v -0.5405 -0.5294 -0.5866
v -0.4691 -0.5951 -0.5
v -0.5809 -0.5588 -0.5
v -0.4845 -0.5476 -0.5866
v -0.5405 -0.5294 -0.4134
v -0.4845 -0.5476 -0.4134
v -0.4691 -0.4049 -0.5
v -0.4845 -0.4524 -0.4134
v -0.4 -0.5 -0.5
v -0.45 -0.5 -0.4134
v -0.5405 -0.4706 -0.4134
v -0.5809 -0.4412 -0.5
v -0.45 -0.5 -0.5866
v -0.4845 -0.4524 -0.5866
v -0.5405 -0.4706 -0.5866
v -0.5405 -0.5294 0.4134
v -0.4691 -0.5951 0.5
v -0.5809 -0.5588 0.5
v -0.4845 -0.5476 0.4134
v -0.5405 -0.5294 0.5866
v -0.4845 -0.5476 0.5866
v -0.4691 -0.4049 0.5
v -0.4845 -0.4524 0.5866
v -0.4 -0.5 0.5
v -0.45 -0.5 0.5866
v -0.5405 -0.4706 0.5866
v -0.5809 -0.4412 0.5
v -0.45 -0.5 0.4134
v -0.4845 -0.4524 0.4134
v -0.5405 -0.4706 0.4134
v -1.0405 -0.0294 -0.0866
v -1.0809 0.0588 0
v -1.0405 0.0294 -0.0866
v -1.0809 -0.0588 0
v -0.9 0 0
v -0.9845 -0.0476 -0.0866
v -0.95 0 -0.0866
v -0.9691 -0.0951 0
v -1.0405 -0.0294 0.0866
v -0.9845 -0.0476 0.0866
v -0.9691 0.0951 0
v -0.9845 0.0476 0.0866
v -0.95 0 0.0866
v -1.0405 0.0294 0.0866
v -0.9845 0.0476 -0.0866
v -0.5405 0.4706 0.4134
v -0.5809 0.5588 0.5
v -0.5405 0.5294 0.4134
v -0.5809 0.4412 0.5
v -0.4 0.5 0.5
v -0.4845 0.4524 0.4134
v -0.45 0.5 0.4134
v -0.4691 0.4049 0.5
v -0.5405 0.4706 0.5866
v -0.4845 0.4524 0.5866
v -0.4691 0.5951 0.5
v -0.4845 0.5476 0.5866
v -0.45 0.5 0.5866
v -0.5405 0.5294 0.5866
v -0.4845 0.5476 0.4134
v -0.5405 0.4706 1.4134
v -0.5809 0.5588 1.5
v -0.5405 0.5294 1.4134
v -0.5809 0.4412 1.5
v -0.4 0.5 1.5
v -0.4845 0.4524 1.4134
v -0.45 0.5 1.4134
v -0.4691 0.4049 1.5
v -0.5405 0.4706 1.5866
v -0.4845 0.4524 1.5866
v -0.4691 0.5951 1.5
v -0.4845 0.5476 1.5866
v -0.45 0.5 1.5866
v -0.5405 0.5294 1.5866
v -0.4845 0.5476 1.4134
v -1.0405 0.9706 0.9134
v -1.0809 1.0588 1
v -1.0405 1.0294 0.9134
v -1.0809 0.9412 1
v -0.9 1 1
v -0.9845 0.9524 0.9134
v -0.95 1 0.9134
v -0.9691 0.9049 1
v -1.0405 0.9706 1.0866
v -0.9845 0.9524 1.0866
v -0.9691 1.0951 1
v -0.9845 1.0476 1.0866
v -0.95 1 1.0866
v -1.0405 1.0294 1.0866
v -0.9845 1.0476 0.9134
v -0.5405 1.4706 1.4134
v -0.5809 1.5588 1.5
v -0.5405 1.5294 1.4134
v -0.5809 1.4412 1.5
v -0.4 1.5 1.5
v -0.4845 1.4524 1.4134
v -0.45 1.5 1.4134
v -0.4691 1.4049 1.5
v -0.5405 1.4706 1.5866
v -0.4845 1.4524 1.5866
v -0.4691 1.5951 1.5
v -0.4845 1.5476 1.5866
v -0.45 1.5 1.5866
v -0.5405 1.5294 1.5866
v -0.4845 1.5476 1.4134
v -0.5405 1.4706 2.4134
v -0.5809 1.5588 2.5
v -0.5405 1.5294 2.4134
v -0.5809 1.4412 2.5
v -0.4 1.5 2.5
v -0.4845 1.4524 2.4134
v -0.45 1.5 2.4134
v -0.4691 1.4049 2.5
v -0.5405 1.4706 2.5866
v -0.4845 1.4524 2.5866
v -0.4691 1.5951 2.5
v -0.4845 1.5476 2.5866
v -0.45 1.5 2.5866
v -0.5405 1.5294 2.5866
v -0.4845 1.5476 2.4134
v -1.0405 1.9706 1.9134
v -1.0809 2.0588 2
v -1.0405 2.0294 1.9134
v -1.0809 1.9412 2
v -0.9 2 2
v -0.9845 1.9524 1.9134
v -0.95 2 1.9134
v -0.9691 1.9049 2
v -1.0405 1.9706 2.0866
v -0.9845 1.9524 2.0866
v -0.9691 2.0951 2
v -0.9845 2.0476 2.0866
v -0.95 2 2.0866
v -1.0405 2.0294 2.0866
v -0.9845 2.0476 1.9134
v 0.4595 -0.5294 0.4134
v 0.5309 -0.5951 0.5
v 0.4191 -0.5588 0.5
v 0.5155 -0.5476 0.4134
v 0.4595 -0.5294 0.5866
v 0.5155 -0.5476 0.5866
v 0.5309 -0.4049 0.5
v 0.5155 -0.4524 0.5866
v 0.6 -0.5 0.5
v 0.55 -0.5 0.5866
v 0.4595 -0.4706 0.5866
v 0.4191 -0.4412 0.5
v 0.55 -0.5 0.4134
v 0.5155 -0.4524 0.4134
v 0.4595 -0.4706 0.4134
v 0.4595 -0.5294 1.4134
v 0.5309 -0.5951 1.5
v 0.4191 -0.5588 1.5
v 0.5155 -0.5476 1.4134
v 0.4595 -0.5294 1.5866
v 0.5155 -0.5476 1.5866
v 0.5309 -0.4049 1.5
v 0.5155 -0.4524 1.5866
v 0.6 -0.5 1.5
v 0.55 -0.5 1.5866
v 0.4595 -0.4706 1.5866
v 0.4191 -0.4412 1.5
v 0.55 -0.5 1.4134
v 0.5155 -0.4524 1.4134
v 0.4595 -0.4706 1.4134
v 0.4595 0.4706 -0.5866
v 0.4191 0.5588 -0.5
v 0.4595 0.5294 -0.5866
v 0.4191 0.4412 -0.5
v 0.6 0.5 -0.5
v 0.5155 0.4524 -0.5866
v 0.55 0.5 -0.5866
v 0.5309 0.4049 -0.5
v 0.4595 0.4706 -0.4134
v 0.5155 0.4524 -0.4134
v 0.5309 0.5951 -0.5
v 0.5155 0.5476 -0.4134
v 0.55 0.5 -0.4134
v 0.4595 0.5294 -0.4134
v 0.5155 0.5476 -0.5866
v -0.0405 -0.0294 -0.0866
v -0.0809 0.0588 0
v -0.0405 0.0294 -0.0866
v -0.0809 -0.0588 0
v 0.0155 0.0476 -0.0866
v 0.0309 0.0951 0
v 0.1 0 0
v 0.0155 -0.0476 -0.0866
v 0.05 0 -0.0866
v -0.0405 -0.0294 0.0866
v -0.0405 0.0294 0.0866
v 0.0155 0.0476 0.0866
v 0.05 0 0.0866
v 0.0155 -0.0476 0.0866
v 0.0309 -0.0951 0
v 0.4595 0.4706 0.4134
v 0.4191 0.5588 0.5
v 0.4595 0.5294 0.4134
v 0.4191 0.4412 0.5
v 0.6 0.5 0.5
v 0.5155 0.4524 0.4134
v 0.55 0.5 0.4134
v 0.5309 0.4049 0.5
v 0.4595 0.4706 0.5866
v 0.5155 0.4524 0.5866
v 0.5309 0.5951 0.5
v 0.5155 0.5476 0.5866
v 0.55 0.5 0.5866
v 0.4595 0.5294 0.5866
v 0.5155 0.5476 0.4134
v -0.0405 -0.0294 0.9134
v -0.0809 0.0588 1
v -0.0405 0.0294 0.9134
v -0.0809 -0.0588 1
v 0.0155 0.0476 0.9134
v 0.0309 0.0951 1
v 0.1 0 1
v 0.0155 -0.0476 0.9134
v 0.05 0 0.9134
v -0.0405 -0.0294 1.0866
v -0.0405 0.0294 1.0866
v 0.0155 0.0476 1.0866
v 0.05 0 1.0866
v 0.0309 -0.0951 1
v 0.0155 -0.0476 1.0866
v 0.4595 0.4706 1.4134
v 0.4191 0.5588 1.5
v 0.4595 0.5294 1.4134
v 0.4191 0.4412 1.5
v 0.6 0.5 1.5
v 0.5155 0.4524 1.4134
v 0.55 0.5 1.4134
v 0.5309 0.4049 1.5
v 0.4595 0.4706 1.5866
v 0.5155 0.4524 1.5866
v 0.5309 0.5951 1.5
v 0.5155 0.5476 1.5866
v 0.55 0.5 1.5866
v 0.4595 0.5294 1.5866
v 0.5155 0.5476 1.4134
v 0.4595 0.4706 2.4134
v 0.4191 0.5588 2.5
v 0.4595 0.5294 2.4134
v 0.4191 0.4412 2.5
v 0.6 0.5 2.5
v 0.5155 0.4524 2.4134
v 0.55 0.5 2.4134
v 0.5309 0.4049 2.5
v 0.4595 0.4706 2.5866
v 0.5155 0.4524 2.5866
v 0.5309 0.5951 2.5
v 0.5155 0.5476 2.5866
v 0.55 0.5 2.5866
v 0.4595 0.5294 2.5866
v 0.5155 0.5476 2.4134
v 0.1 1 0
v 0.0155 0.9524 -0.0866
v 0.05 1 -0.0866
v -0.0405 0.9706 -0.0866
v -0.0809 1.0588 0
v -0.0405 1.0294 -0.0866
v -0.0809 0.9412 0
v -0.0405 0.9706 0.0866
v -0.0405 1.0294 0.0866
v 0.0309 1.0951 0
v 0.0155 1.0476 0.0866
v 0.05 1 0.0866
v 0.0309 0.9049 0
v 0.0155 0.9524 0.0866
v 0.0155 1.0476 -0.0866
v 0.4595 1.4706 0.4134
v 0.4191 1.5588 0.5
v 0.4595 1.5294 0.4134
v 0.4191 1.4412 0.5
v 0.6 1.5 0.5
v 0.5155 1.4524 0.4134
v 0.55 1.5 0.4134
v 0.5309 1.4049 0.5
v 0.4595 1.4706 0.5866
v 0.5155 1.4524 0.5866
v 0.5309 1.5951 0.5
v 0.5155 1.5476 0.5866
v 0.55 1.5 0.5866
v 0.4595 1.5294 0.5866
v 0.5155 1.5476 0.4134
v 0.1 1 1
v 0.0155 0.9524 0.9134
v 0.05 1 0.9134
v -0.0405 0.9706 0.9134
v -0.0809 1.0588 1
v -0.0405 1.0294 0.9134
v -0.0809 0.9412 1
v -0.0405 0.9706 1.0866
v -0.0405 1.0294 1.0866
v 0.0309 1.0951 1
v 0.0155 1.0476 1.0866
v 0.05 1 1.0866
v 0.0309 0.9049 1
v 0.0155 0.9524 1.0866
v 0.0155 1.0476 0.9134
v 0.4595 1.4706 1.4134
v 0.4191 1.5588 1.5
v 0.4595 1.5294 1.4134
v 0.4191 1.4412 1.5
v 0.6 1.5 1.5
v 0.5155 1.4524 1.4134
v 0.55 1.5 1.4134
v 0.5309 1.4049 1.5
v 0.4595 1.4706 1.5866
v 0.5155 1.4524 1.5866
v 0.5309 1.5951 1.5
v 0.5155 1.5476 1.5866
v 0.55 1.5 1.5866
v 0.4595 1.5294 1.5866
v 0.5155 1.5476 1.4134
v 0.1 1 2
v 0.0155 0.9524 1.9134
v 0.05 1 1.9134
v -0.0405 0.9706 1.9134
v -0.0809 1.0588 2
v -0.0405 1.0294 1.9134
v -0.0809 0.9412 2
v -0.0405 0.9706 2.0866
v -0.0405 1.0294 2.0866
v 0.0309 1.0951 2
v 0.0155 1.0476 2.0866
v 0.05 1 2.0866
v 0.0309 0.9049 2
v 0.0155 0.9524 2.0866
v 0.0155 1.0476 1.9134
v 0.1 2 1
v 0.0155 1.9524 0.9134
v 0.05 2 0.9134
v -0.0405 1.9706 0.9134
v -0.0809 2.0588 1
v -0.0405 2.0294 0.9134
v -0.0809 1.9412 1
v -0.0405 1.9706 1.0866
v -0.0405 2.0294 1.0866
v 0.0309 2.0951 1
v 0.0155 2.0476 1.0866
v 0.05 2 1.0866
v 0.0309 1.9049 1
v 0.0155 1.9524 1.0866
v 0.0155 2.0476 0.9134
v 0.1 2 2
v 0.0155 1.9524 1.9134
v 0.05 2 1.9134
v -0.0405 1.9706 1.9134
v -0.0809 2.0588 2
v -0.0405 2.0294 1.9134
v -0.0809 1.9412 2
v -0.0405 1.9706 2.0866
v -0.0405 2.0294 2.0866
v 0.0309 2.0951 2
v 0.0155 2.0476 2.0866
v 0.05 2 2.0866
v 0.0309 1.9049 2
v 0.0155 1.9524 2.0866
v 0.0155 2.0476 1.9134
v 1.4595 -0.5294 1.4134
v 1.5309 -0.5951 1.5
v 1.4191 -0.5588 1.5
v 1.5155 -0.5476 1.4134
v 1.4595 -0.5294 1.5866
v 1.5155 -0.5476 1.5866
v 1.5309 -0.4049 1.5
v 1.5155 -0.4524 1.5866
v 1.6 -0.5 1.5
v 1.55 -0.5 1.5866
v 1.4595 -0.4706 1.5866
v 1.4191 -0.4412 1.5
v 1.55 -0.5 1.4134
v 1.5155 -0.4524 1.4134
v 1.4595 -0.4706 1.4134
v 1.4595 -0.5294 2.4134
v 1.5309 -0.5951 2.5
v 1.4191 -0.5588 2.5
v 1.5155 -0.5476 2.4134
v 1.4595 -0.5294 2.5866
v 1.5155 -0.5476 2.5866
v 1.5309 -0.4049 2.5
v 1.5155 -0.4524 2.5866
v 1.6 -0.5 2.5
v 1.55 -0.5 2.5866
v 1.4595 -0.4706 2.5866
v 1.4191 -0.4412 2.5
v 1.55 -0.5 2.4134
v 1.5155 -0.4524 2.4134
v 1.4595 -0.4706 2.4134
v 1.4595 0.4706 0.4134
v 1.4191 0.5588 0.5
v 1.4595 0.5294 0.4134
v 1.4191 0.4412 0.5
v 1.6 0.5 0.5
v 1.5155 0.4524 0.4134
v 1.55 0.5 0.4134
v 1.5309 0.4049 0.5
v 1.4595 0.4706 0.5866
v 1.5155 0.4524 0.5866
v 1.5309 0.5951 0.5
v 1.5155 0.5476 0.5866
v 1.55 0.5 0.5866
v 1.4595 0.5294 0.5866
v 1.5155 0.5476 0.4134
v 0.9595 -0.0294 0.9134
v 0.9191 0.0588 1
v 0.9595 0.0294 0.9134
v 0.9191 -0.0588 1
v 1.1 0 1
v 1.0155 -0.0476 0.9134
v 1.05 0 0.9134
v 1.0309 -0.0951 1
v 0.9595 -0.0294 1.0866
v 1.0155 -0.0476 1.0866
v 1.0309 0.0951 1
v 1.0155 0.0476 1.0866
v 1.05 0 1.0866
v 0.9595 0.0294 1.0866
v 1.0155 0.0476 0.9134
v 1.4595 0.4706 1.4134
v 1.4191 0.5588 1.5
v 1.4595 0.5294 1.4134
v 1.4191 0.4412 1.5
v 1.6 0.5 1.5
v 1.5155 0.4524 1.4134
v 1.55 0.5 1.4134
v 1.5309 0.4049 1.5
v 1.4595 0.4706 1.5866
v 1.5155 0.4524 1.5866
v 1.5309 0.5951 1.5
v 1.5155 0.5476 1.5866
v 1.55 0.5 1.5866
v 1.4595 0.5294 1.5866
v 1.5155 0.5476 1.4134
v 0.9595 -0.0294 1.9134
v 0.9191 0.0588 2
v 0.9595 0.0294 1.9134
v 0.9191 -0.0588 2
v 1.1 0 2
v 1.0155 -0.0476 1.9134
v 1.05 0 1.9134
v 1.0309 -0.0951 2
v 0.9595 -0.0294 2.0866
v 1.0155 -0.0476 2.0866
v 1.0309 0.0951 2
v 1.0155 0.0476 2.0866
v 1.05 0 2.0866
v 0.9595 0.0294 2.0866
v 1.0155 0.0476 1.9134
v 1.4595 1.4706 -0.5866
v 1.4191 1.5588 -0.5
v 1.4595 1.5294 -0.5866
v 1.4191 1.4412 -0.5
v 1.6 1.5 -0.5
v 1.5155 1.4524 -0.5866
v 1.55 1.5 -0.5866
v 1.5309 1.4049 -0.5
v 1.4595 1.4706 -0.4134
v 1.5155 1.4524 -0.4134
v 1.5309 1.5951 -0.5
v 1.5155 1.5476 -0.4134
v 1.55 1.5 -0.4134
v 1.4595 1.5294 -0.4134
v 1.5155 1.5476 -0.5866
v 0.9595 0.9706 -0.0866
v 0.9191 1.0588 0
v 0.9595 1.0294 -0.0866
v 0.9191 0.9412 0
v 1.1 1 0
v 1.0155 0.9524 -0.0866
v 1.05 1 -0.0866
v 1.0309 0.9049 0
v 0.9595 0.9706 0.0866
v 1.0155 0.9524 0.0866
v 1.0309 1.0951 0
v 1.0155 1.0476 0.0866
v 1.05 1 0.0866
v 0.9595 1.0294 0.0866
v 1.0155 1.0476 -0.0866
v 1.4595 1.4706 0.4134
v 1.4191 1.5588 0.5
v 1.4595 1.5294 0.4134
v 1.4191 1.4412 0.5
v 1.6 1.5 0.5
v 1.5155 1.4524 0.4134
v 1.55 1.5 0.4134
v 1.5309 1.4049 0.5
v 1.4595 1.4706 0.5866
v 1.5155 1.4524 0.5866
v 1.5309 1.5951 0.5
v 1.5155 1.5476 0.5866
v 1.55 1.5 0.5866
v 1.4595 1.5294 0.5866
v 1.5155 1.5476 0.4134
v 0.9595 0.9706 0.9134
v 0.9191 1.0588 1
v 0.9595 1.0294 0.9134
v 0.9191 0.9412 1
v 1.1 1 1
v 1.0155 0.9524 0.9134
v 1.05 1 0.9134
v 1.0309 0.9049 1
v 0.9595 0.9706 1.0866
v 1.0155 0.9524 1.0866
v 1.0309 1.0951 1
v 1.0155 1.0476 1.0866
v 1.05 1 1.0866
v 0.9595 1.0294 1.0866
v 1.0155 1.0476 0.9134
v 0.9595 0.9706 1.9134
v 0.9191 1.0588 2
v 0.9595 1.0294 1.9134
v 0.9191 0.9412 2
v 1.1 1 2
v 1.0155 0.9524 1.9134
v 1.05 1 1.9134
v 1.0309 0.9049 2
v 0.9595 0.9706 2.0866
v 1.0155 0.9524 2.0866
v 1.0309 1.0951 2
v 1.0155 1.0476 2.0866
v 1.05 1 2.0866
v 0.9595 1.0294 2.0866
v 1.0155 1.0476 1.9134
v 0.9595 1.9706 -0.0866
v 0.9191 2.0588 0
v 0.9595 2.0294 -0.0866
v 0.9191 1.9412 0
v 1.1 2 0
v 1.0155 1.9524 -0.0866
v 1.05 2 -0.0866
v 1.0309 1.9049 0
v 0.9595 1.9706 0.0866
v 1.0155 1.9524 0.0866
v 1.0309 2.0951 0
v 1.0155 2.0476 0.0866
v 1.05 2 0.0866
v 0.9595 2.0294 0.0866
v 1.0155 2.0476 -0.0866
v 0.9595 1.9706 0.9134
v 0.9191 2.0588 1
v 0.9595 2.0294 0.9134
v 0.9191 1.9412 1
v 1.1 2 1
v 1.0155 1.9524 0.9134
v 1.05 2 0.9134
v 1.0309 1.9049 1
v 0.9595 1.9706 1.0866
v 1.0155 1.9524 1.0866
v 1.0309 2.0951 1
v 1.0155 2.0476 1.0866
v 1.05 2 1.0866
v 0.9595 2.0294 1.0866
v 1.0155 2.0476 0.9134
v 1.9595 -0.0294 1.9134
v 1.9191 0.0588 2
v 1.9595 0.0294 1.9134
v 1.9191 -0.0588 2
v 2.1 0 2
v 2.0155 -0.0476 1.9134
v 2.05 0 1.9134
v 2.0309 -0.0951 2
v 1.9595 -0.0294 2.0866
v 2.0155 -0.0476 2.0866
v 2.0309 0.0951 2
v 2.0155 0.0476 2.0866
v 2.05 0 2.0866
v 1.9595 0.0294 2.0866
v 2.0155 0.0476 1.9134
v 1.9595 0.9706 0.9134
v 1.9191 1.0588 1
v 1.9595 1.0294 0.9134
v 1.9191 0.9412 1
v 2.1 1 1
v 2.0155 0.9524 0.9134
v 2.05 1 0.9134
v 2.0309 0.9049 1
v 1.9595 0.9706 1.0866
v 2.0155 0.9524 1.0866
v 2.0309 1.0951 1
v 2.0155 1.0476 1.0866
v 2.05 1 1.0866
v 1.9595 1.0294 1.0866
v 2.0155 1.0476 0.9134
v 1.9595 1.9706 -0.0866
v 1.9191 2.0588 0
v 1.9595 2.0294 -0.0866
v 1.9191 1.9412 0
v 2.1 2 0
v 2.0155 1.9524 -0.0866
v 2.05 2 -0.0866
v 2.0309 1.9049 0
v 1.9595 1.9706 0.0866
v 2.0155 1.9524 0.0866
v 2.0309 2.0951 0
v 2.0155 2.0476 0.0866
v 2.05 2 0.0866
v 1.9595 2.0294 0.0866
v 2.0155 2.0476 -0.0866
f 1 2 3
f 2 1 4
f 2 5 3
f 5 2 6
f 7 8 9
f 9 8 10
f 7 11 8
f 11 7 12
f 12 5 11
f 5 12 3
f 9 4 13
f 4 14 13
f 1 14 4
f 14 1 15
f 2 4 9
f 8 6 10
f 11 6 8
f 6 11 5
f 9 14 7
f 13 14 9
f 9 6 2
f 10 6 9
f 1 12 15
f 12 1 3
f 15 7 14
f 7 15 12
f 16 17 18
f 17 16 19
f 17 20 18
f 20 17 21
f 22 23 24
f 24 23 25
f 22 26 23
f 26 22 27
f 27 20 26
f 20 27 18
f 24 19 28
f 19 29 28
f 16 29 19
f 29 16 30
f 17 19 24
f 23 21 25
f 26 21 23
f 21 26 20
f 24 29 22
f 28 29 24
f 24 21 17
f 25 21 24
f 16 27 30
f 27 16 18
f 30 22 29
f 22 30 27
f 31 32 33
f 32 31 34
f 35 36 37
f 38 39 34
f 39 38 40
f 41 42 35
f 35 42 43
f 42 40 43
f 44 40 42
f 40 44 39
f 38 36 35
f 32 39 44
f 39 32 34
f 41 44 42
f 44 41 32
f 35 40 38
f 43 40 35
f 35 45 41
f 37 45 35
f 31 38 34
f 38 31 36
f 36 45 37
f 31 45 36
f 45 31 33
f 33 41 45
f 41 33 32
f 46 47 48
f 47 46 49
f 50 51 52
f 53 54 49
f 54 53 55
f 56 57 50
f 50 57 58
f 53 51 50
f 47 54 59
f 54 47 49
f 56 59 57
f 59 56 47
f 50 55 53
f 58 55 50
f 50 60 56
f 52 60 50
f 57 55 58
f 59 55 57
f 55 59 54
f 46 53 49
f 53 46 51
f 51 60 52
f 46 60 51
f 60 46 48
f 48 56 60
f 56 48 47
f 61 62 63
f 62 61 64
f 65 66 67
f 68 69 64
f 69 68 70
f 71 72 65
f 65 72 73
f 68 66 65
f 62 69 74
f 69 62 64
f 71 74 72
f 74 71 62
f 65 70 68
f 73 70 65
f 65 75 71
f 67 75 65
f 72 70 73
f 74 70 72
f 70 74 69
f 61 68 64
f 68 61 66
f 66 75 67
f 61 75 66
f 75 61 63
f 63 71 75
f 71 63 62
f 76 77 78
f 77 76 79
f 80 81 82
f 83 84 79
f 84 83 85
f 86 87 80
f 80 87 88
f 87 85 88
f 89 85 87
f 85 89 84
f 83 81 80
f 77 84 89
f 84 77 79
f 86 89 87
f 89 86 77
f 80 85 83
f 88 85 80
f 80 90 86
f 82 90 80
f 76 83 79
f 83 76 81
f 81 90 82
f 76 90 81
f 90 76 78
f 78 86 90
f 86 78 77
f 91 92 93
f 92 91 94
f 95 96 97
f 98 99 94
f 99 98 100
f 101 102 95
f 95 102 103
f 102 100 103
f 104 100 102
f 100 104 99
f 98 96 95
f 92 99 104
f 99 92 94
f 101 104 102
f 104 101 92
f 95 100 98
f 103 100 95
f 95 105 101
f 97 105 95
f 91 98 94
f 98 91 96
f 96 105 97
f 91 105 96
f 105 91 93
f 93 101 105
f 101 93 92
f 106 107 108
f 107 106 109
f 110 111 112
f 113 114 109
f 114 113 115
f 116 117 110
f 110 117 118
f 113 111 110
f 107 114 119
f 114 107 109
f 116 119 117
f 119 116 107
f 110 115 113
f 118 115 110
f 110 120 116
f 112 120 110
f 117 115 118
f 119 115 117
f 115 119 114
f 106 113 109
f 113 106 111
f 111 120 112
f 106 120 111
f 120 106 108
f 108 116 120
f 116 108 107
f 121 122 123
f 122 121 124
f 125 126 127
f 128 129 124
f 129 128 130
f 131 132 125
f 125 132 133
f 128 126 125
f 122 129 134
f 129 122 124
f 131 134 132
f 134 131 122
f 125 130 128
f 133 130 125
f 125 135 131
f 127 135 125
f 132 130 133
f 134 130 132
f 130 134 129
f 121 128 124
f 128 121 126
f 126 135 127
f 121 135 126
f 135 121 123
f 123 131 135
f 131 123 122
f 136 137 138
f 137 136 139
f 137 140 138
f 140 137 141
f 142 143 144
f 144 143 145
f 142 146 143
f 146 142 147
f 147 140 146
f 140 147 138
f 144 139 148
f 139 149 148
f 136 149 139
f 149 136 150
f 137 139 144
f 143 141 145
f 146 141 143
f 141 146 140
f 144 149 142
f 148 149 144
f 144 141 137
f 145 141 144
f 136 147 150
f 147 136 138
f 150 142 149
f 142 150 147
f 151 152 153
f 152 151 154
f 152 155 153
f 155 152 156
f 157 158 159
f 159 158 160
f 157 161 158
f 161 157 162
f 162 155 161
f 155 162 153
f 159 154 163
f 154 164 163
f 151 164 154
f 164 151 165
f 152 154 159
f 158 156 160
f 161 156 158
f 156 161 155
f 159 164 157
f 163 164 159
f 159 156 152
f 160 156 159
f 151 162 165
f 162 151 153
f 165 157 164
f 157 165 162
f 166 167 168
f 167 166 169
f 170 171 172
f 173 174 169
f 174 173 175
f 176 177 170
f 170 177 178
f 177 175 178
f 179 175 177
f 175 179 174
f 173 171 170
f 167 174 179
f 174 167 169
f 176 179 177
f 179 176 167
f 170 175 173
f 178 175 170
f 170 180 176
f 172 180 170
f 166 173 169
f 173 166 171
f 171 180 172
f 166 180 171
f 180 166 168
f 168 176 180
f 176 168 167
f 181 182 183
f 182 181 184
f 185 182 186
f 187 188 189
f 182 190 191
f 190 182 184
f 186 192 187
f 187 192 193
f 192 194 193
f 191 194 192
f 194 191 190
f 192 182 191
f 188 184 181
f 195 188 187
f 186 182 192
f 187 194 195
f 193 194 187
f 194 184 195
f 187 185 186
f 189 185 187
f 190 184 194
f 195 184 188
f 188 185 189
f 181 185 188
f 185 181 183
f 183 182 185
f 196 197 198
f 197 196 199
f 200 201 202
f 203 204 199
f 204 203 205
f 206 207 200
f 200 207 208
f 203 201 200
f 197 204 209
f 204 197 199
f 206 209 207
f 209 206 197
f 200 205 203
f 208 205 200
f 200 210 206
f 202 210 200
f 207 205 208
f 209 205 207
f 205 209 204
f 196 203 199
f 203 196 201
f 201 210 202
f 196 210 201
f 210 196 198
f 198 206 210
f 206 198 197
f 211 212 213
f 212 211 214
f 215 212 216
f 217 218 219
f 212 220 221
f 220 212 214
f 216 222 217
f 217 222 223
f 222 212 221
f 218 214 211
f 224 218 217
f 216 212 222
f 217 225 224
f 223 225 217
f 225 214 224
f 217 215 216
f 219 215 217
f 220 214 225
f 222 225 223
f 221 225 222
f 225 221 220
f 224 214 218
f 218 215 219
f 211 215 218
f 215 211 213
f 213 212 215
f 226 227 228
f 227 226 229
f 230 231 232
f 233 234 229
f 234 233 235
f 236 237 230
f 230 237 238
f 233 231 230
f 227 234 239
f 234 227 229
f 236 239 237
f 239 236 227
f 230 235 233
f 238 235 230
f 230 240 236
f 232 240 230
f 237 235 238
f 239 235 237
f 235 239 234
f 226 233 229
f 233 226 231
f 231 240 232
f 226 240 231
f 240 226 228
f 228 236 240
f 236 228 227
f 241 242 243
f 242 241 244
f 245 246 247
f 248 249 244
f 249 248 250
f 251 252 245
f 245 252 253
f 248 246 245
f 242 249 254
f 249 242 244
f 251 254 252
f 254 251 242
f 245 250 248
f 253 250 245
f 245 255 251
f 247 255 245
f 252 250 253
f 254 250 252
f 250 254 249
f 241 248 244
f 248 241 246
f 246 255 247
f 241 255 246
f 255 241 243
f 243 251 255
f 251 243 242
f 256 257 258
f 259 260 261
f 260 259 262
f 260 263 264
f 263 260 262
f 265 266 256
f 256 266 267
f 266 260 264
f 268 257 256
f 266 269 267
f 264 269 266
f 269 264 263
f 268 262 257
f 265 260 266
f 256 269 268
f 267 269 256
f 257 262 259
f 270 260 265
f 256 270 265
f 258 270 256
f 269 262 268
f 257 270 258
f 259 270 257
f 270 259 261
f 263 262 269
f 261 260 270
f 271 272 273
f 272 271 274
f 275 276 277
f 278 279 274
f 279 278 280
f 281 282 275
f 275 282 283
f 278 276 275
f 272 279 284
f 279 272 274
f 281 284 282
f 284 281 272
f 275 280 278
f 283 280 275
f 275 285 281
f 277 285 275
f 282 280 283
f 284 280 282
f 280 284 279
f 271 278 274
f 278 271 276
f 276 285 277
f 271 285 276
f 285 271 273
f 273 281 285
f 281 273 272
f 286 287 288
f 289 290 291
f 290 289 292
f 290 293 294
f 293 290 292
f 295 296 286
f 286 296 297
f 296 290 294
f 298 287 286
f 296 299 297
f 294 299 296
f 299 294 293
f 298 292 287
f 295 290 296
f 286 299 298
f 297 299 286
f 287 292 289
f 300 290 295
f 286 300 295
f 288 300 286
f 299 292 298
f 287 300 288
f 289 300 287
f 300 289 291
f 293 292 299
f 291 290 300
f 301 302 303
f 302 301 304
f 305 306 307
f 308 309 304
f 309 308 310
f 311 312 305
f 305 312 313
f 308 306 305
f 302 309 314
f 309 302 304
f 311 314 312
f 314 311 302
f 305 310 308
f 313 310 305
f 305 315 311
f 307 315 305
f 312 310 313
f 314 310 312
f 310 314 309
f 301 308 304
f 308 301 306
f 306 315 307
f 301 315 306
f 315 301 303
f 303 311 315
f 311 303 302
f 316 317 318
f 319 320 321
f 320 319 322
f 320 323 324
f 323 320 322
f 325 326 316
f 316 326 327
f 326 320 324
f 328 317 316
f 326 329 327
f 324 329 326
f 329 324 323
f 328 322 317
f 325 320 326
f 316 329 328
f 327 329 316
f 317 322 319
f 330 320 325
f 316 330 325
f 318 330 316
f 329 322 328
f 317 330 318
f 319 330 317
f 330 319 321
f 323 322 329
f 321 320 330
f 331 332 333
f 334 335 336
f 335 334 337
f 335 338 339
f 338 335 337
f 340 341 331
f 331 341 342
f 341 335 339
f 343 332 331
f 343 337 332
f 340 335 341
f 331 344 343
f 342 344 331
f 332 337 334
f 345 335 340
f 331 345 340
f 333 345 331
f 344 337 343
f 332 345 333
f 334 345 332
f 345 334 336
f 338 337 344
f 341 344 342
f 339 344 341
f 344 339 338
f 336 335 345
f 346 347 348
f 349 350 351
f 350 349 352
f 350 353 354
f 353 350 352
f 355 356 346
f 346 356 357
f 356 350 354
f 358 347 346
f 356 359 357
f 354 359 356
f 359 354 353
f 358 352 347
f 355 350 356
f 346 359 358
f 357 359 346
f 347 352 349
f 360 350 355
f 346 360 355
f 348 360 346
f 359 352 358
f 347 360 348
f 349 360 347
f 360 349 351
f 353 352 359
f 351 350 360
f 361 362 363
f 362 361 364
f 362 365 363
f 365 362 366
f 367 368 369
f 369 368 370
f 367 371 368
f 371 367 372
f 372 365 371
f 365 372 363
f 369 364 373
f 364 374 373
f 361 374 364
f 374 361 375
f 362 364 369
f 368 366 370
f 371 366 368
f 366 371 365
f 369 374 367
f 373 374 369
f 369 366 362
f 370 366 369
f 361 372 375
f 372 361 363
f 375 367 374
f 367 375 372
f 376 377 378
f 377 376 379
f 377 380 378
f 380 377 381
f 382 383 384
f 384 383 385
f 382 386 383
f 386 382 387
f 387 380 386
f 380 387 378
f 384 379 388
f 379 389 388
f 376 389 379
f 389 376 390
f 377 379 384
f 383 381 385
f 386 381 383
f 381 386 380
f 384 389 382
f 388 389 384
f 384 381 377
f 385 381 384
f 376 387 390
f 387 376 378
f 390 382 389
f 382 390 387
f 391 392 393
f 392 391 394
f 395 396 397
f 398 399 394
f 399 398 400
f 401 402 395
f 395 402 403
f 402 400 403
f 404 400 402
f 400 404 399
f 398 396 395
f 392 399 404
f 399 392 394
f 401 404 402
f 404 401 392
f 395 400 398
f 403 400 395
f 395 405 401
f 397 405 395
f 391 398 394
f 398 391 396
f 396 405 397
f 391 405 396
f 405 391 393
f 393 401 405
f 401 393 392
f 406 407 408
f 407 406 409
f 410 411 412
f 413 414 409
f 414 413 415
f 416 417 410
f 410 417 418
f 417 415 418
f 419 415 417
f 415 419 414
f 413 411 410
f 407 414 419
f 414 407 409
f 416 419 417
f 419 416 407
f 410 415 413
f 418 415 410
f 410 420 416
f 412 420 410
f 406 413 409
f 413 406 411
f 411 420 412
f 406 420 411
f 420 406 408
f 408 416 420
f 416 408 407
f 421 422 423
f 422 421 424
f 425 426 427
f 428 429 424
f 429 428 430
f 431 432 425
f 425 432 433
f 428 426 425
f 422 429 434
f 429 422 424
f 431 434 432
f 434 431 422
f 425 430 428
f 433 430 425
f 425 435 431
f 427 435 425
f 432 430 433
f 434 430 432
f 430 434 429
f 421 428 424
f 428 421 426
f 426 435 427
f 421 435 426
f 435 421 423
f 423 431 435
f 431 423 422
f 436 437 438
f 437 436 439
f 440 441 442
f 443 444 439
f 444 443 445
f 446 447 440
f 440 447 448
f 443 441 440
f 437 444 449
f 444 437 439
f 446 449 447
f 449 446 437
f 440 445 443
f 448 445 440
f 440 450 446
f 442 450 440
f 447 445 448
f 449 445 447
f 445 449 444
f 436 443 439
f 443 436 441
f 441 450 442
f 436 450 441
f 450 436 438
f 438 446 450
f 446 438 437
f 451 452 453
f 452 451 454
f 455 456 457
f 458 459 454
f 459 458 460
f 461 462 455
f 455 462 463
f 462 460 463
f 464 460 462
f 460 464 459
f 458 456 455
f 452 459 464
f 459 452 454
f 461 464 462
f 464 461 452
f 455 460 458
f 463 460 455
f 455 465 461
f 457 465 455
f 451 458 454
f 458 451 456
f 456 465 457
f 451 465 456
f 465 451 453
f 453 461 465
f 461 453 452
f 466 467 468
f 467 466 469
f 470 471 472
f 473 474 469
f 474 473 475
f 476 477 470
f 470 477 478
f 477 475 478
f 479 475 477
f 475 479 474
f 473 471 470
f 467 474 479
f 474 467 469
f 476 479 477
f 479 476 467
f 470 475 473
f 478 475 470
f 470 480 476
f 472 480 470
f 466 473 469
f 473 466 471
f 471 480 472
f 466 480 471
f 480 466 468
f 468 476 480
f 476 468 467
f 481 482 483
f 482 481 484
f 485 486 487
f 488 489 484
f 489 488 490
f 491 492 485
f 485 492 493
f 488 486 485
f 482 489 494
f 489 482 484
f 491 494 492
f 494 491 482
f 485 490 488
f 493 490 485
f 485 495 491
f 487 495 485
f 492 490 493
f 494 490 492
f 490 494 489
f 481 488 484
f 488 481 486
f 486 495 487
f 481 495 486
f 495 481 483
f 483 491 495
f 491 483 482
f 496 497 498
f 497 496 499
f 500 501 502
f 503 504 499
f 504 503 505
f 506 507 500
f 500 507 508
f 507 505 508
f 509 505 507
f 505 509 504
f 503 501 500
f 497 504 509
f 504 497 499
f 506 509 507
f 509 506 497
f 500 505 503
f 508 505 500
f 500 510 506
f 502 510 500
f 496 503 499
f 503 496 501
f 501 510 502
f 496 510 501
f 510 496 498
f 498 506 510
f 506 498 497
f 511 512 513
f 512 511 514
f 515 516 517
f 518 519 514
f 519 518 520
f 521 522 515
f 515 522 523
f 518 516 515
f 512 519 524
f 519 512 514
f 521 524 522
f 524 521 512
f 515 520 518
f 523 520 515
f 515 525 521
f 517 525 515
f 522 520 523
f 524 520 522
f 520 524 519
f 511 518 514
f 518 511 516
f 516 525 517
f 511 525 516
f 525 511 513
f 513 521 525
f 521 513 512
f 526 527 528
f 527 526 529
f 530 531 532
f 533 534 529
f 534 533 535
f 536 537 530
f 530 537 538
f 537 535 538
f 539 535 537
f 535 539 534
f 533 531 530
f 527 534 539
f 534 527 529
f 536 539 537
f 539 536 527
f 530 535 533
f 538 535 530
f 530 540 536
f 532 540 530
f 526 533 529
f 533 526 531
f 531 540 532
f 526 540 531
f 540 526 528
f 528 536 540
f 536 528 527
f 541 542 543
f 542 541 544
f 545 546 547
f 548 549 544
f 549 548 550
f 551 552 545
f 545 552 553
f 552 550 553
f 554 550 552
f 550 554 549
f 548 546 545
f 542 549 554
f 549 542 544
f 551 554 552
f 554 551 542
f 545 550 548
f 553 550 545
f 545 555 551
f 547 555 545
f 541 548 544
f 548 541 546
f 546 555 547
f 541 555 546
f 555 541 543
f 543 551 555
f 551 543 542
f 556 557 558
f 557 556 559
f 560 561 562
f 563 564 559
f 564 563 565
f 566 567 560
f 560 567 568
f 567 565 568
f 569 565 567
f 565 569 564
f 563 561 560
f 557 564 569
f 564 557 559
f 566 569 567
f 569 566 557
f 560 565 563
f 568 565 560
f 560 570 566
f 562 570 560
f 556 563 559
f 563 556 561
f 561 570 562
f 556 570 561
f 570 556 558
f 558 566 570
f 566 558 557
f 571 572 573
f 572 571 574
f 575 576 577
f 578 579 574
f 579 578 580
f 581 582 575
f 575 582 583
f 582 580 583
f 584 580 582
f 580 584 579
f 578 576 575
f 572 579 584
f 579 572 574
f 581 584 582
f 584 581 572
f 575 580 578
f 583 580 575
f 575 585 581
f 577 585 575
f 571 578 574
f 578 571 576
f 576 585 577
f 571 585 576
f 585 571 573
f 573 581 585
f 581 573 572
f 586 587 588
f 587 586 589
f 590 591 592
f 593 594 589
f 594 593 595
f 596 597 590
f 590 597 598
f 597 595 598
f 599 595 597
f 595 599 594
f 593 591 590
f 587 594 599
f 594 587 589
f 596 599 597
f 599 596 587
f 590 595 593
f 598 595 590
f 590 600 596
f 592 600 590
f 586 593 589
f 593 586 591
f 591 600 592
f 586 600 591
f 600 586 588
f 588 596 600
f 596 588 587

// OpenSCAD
// file: 3d_tetrahedres.scad
use <lattice.scad>;

// Check if a vertex is adjacent to the central layer (that sets the size of processor).
// n as n_code in article (starts at 1).
function central_layer(x, y, z, n) = ((x+z == n-2) || (x+z == n-1)) ? true : false;

// Elementary tetrahedron as described in Equation (18) of arXiv:1311.0879.
// x, y, z : coordinates of vector x in arXiv:1311.0879
// s : +- 1
// permut : integer between 0 and 5 (included) that describe the permutation (a, b, c) :
//          0 : (a, b, c) = (i, j, k)
//          1 : (a, b, c) = (i, k, j)
//          2 : (a, b, c) = (j, i, k)
//          3 : (a, b, c) = (j, k, i)
//          4 : (a, b, c) = (k, i, j)
//          5 : (a, b, c) = (k, j, i)
// n : we keep only tetrahedron included in the code structure indexed by n.
//     n is as in Equation (19) of arXiv:1311.0879 (starts at 1).
//     use -1 for no filter
 module tetraedre (x, y, z, s, permut, n) {
     // if (permut==0) {xa=1; ya=0; za=0; xb=0; yb=1; zb=0; xc=0; yc=0; zc=1;}
     // if (permut==1) {xa=1; ya=0; za=0; xb=0; yb=0; zb=1; xc=0; yc=1; zc=0;}
     // if (permut==2) {xa=0; ya=1; za=0; xb=1; yb=0; zb=0; xc=0; yc=0; zc=1;}
     // if (permut==3) {xa=0; ya=1; za=0; xb=0; yb=0; zb=1; xc=1; yc=0; zc=0;}
     // if (permut==4) {xa=0; ya=0; za=1; xb=1; yb=0; zb=0; xc=0; yc=1; zc=0;}
     // if (permut==5) {xa=0; ya=0; za=1; xb=0; yb=1; zb=0; xc=1; yc=0; zc=0;}
     xa = permut==0 || permut==1 ? 1 : 0;
     ya = permut==2 || permut==3 ? 1 : 0;
     za = permut==4 || permut==5 ? 1 : 0;
     xb = permut==2 || permut==4 ? 1 : 0;
     yb = permut==0 || permut==5 ? 1 : 0;
     zb = permut==1 || permut==3 ? 1 : 0;
     xc = permut==3 || permut==5 ? 1 : 0;
     yc = permut==1 || permut==4 ? 1 : 0;
     zc = permut==0 || permut==2 ? 1 : 0;

     // Coordinates of vertices of the tetrahedron.
     x1=x; y1=y; z1=z;                                               // x
     x2=x+xa; y2=y+ya; z2=z+za;                                      // x + a
     x3=x+(xa+s*xb+xc)/2; y3=y+(ya+s*yb+yc)/2; z3=z+(za+s*zb+zc)/2;  // x + (a+sb+c)/2
     x4=x+(xa+s*xb-xc)/2; y4=y+(ya+s*yb-yc)/2; z4=z+(za+s*zb-zc)/2;  // x + (a+sb-c)/2

     if (n == -1 || (
         filtre(x1, y1, z1, n)
         && filtre(x2, y2, z2, n)
         && filtre(x3, y3, z3, n)
         && filtre(x4, y4, z4, n)
     )) {
         // echo(x, y, z, s, permut, n);
         if (central_layer(x1, y1, z1, n)
             && central_layer(x2, y2, z2, n)
             && central_layer(x3, y3, z3, n)
             && central_layer(x4, y4, z4, n))
            {
             echo("One central tetraedron");  // For counting
             color("red")
             polyhedron(
                 points=[[x1,y1,z1], [x2,y2,z2], [x3,y3,z3], [x4,y4,z4]],
                 faces=[[0,1,2], [0,1,3], [0,2,3], [1,3,2]]
                );
            }
         else {
             polyhedron(
                 points=[[x1,y1,z1], [x2,y2,z2], [x3,y3,z3], [x4,y4,z4]],
                 faces=[[0,1,2], [0,1,3], [0,2,3], [1,3,2]]
                );
            }
        }
    }


n = 3;
grille(n);

for (x = [-1:n-1]) {
        for (y = [-1:n-1]) {
            for (z = [-1:n-1]) {
                for (s=[-1:2:1]) {
                    for (permut = [0:5]) {
                        tetraedre(x, y, z, s, permut, n);
                    }
                }
            }
        }
    }
// file: lattice.scad
// Centered cubic grid, as presented in Equation (18) from arXiv:1311.0879


//  Uncut centered cubic grid.
module maille(nb) {
    // Diameter of small balls
    rad = 0.1;
    for (x = [0:nb]) {
        for (y = [0:nb]) {
            for (z = [0:nb]) {
                type = abs((x + y + z) % 2);  // Correspond to color
                x2 = x+0.5; y2 = y+0.5; z2 = z+0.5;
                if (type == 0) {
                        color("red") translate([x, y, z]) sphere(rad);
                        color("blue") translate([x2, y2, z2]) sphere(rad);
                        }
                if (type == 1) {
                    color("green") translate([x, y, z]) sphere(rad);
                    color("yellow") translate([x2, y2, z2]) sphere(rad);
                    }
                }
            }
        }
    }



// Check Equation (19) of arXiv:1311.0879 (n stars at 1).
function filtre(x, y, z, n) = ((x+y+z <= 0 + 2*(n-1))
                               && (x-y-z <= 1/2)
                               && (-x+y-z <= 1)
                               && (-x-y+z <= 3/2)) ? true : false;


// Grid as presented in Equations (18) and (19) of arXiv:1311.0879.
// n : number n in Equation (19): index in the code family, starts at 1.
module grille(n) {
    // Diameter of small balls
    rad = 0.1;
    for (x = [-1:n-1]) {
        for (y = [-1:n-1]) {
            for (z = [-1:n-1]) {
                type = abs((x + y + z) % 2);  // Correspond to color
                if (filtre(x, y, z, n)) {
                    if (type == 0) {
                        color("red") translate([x, y, z]) sphere(rad);
                        }
                    if (type == 1) {
                        color("green") translate([x, y, z]) sphere(rad);
                        }
                    }
                x2 = x+0.5; y2 = y+0.5; z2 = z+0.5;
                if (filtre(x2, y2, z2, n)) {
                    if (type == 0) {
                        color("blue") translate([x2, y2, z2]) sphere(rad);
                        }
                    if (type == 1) {
                        color("yellow") translate([x2, y2, z2]) sphere(rad);
                        }
                    }
                }
            }
        }
    }

//maille(2);
grille(2);
// main file
use <lattice.scad>;
use <3d_tetrahedres.scad>;

// Layer 1 : 1 qubit
color("black") tetraedre(-1, 0, 0, -1, 0, 3);

// Layer 2 : 10 qubit
color("Chartreuse") tetraedre(0, 0, 1, -1, 0, 3);
color("Chartreuse") tetraedre(0, 0, 1, -1, 1, 3);
color("Chartreuse") tetraedre(0, 1, 0, -1, 0, 3);
color("Chartreuse") tetraedre(0, 0, 0, 1, 2, 3);
color("Chartreuse") tetraedre(0, 0, 0, 1, 4, 3);
color("Chartreuse") tetraedre(0, 0, 0, 1, 3, 3);
color("Chartreuse") tetraedre(0, 0, 0, 1, 5, 3);
color("Chartreuse") tetraedre(0, 0, 0, -1, 5, 3);
color("Chartreuse") tetraedre(0, 0, 0, -1, 4, 3);
color("Chartreuse") tetraedre(-1, 0, 0, 1, 1, 3);

// Layer 3 : 31 qubits
color("Magenta") tetraedre(1, 0, 1, 1, 2, 3);
color("Magenta") tetraedre(1, 0, 1, 1, 4, 3);
color("Magenta") tetraedre(1, 1, 0, 1, 2, 3);
color("Magenta") tetraedre(1, 1, 0, 1, 4, 3);
color("Magenta") tetraedre(1, 0, 1, 1, 3, 3);
color("Magenta") tetraedre(1, 0, 1, 1, 5, 3);
color("Magenta") tetraedre(1, 1, 0, 1, 3, 3);
color("Magenta") tetraedre(1, 1, 0, 1, 5, 3);
color("Magenta") tetraedre(0, 1, 1, -1, 0, 3);
color("Magenta") tetraedre(0, 1, 1, -1, 1, 3);
color("Magenta") tetraedre(1, 0, 1, -1, 3, 3);
color("Magenta") tetraedre(1, 0, 1, -1, 5, 3);
color("Magenta") tetraedre(1, 1, 0, -1, 5, 3);
color("Magenta") tetraedre(1, 0, 1, -1, 2, 3);
color("Magenta") tetraedre(1, 0, 1, -1, 4, 3);
color("Magenta") tetraedre(1, 1, 0, -1, 4, 3);
color("Magenta") tetraedre(0, 0, 1, 1, 3, 3);
color("Magenta") tetraedre(0, 0, 1, 1, 0, 3);
color("Magenta") tetraedre(0, 0, 1, 1, 1, 3);
color("Magenta") tetraedre(0, 1, 0, 1, 1, 3);
color("Magenta") tetraedre(0, 0, 1, 1, 2, 3);
color("Magenta") tetraedre(0, 1, 0, 1, 4, 3);
color("Magenta") tetraedre(1, 0, 2, -1, 0, 3);
color("Magenta") tetraedre(1, 0, 2, -1, 1, 3);
color("Magenta") tetraedre(1, 1, 1, -1, 0, 3);
color("Magenta") tetraedre(1, 1, 1, -1, 1, 3);
color("Magenta") tetraedre(1, 2, 0, -1, 0, 3);
color("Magenta") tetraedre(-1, 1, 1, -1, 0, 3);
color("Magenta") tetraedre(0, 0, 1, -1, 3, 3);
color("Magenta") tetraedre(0, 1, 0, -1, 5, 3);
color("Magenta") tetraedre(0, 0, 1, -1, 2, 3);

// Layer 4 : 19 qubits
color("Cyan") tetraedre(0, 1, 1, 1, 0, 3);
color("Cyan") tetraedre(0, 1, 1, 1, 1, 3);
color("Cyan") tetraedre(0, 1, 1, 1, 2, 3);
color("Cyan") tetraedre(0, 1, 1, 1, 4, 3);
color("Cyan") tetraedre(0, 1, 1, 1, 3, 3);
color("Cyan") tetraedre(0, 1, 1, 1, 5, 3);
color("Cyan") tetraedre(1, 0, 2, -1, 3, 3);
color("Cyan") tetraedre(1, 1, 1, -1, 3, 3);
color("Cyan") tetraedre(1, 1, 1, -1, 5, 3);
color("Cyan") tetraedre(1, 2, 0, -1, 5, 3);
color("Cyan") tetraedre(1, 0, 2, -1, 2, 3);
color("Cyan") tetraedre(1, 1, 1, -1, 2, 3);
color("Cyan") tetraedre(1, 1, 1, -1, 4, 3);
color("Cyan") tetraedre(0, 1, 2, -1, 0, 3);
color("Cyan") tetraedre(0, 1, 2, -1, 1, 3);
color("Cyan") tetraedre(0, 2, 1, -1, 0, 3);
color("Cyan") tetraedre(0, 1, 1, -1, 5, 3);
color("Cyan") tetraedre(0, 1, 1, -1, 4, 3);
color("Cyan") tetraedre(-1, 1, 1, 1, 1, 3);

// Layer 5 : 4 qubits
color("Orange") tetraedre(-1, 2, 2, -1, 0, 3);
color("Orange") tetraedre(0, 1, 2, -1, 3, 3);
color("Orange") tetraedre(0, 2, 1, -1, 5, 3);
color("Orange") tetraedre(0, 1, 2, -1, 2, 3);

grille(3);
